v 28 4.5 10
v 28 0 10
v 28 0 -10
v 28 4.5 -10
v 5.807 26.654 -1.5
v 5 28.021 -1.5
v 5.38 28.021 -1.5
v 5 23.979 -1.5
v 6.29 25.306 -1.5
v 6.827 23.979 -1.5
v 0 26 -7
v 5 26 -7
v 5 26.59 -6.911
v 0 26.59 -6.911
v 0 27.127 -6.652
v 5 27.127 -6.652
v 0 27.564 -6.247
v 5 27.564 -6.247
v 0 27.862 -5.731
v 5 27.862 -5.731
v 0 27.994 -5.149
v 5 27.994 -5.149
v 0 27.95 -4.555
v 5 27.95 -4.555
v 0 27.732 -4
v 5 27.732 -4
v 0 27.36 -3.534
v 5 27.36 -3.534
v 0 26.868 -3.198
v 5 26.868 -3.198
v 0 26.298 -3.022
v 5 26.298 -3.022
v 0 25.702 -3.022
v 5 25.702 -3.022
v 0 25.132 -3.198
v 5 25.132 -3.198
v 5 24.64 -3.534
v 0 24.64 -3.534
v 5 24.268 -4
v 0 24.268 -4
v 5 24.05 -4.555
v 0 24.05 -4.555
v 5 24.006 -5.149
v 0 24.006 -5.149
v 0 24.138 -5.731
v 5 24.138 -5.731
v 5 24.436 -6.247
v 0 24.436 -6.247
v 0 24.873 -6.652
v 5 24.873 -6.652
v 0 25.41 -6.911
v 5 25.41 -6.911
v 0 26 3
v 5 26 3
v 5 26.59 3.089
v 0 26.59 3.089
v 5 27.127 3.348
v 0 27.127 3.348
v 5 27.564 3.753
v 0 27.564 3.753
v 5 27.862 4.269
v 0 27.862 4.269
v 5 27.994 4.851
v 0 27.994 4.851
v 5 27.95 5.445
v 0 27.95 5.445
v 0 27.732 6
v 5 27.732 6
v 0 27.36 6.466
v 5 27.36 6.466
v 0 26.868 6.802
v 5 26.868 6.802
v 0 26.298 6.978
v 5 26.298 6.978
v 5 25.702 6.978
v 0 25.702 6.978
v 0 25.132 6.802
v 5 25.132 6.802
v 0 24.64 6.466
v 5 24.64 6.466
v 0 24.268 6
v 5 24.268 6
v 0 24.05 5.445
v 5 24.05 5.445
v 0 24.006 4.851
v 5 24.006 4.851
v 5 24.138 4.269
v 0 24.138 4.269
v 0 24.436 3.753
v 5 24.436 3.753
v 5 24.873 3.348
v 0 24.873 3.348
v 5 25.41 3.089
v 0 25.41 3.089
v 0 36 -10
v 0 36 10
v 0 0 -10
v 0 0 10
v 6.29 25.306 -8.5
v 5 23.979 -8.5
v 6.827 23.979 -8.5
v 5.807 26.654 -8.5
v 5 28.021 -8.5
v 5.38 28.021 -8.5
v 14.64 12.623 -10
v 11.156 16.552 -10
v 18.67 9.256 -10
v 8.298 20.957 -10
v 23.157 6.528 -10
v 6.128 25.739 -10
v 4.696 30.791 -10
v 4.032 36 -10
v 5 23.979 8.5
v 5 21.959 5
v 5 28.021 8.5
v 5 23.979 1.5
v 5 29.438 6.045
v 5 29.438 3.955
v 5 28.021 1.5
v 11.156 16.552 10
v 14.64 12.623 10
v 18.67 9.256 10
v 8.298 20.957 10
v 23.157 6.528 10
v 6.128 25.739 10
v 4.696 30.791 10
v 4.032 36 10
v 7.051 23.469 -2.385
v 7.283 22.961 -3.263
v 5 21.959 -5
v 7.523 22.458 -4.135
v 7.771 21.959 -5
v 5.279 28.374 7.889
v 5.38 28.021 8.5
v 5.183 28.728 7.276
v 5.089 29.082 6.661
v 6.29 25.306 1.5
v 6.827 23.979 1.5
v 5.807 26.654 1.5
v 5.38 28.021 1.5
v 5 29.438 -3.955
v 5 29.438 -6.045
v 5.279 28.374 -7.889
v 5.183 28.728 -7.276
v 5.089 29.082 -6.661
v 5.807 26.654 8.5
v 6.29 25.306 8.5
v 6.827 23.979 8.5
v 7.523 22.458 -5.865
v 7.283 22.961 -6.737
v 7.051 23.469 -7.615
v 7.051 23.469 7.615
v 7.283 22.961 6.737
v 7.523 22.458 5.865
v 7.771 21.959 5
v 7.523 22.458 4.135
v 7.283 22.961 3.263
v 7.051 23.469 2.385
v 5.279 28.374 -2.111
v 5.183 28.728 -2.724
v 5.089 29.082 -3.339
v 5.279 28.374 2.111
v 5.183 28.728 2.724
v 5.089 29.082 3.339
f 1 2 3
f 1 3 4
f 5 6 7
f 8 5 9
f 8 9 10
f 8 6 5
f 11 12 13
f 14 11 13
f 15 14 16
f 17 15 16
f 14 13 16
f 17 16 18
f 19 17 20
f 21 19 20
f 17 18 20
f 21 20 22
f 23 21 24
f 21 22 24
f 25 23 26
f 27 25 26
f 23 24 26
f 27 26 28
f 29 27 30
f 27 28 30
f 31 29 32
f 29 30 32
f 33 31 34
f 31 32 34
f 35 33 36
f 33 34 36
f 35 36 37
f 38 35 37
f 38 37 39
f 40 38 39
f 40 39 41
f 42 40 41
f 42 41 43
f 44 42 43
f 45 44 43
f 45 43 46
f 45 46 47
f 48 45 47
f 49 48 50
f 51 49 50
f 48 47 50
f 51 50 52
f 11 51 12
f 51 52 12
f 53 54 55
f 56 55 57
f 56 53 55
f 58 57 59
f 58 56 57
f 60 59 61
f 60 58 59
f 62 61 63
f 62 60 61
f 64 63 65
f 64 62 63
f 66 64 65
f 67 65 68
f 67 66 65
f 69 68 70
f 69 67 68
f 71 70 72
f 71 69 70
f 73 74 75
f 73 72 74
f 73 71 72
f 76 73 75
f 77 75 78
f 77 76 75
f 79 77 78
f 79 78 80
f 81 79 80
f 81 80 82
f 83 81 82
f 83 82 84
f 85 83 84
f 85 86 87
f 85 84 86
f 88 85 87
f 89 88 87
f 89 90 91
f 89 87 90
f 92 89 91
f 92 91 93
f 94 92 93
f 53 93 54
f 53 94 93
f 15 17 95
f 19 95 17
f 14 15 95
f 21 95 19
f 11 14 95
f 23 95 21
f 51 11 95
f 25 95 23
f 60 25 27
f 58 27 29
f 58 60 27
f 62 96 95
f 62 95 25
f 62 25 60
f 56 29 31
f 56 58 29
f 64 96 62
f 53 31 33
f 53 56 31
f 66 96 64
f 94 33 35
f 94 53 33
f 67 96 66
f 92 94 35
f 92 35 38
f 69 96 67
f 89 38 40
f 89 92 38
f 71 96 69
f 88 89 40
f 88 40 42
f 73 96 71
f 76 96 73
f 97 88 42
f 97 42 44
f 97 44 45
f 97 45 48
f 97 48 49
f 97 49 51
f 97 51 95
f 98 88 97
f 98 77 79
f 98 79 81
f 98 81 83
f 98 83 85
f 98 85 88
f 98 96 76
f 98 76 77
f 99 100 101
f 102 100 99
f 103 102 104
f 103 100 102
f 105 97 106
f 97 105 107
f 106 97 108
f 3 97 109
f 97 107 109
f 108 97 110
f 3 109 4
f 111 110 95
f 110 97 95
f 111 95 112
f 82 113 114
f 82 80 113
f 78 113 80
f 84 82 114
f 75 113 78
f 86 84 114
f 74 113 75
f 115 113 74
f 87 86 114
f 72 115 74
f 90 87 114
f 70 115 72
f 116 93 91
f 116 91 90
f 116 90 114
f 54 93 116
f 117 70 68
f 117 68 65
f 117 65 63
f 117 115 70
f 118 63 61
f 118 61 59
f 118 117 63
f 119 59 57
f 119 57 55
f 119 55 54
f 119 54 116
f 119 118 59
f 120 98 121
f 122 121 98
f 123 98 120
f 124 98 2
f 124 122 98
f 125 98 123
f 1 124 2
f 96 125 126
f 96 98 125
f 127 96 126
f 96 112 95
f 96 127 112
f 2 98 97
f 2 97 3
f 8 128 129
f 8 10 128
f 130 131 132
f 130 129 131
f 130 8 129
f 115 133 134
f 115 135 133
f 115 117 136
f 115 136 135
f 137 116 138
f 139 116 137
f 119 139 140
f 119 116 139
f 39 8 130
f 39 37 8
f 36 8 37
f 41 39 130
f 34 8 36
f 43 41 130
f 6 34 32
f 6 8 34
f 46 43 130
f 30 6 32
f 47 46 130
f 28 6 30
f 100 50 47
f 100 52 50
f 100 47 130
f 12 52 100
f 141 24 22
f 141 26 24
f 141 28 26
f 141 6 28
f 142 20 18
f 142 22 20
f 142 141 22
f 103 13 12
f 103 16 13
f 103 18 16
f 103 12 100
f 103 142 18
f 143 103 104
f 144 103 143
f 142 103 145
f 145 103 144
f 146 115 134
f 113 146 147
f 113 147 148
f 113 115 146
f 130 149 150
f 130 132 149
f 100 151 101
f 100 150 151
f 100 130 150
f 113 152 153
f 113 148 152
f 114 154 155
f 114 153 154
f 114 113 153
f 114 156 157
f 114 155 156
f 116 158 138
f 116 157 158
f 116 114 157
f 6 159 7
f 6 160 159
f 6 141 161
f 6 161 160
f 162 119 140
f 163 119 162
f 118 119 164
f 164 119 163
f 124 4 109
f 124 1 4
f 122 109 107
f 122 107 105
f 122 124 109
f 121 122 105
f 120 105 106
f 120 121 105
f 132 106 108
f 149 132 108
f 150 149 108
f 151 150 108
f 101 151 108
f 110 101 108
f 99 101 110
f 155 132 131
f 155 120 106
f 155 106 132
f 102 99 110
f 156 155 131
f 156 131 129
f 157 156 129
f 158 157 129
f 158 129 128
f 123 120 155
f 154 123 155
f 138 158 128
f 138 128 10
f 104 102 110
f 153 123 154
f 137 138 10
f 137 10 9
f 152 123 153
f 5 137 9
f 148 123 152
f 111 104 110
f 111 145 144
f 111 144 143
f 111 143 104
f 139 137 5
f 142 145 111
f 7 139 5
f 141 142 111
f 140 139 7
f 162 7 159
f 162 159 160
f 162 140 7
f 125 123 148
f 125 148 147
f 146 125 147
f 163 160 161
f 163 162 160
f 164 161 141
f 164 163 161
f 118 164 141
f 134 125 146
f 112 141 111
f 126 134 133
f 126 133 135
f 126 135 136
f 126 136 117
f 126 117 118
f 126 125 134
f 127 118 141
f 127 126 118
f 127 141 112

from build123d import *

# Parameters (mm, degrees)
EXTRUDE_1_DEPTH     = 10
SKETCH_2_R          = 2
CUT_EXTRUDE_2_DEPTH = 10
CUT_EXTRUDE_3_DEPTH = 20


with BuildPart() as part:
    # 草图1 → 凸台-拉伸1 (new, symmetric)
    with BuildSketch(Plane.XY):
        with BuildLine():
            Line((0, 36), (0, 0))
            Line((0, 0), (28, 0))
            Line((28, 0), (28, 4.5))
            ThreePointArc((28, 4.5), (11.156427167, 16.552318383), (4.032383098, 36))
            Line((4.032383098, 36), (0, 36))
        make_face()
    extrude(amount=EXTRUDE_1_DEPTH, both=True)

    # 草图2 → 切除-拉伸2 (cut, symmetric)
    with BuildSketch(Plane(origin=(0, 0, 0), x_dir=(0, 0, -1), z_dir=(1, 0, 0))):
        with Locations((-5, 26)):
            Circle(SKETCH_2_R)
        with Locations((5, 26)):
            Circle(SKETCH_2_R)
    extrude(amount=CUT_EXTRUDE_2_DEPTH, both=True, mode=Mode.SUBTRACT)

    # 草图3 → 切除-拉伸3 (cut)
    with BuildSketch(Plane(origin=(5, 0, 0), x_dir=(0, 0, -1), z_dir=(1, 0, 0))):
        Polygon((-5, 30.041451884), (-8.5, 28.020725942), (-8.5, 23.979274058), (-5, 21.958548116), (-1.5, 23.979274058), (-1.5, 28.020725942), align=None)
        Polygon((5, 30.041451884), (1.5, 28.020725942), (1.5, 23.979274058), (5, 21.958548116), (8.5, 23.979274058), (8.5, 28.020725942), align=None)
    extrude(amount=CUT_EXTRUDE_3_DEPTH, mode=Mode.SUBTRACT)


solid = part.part
